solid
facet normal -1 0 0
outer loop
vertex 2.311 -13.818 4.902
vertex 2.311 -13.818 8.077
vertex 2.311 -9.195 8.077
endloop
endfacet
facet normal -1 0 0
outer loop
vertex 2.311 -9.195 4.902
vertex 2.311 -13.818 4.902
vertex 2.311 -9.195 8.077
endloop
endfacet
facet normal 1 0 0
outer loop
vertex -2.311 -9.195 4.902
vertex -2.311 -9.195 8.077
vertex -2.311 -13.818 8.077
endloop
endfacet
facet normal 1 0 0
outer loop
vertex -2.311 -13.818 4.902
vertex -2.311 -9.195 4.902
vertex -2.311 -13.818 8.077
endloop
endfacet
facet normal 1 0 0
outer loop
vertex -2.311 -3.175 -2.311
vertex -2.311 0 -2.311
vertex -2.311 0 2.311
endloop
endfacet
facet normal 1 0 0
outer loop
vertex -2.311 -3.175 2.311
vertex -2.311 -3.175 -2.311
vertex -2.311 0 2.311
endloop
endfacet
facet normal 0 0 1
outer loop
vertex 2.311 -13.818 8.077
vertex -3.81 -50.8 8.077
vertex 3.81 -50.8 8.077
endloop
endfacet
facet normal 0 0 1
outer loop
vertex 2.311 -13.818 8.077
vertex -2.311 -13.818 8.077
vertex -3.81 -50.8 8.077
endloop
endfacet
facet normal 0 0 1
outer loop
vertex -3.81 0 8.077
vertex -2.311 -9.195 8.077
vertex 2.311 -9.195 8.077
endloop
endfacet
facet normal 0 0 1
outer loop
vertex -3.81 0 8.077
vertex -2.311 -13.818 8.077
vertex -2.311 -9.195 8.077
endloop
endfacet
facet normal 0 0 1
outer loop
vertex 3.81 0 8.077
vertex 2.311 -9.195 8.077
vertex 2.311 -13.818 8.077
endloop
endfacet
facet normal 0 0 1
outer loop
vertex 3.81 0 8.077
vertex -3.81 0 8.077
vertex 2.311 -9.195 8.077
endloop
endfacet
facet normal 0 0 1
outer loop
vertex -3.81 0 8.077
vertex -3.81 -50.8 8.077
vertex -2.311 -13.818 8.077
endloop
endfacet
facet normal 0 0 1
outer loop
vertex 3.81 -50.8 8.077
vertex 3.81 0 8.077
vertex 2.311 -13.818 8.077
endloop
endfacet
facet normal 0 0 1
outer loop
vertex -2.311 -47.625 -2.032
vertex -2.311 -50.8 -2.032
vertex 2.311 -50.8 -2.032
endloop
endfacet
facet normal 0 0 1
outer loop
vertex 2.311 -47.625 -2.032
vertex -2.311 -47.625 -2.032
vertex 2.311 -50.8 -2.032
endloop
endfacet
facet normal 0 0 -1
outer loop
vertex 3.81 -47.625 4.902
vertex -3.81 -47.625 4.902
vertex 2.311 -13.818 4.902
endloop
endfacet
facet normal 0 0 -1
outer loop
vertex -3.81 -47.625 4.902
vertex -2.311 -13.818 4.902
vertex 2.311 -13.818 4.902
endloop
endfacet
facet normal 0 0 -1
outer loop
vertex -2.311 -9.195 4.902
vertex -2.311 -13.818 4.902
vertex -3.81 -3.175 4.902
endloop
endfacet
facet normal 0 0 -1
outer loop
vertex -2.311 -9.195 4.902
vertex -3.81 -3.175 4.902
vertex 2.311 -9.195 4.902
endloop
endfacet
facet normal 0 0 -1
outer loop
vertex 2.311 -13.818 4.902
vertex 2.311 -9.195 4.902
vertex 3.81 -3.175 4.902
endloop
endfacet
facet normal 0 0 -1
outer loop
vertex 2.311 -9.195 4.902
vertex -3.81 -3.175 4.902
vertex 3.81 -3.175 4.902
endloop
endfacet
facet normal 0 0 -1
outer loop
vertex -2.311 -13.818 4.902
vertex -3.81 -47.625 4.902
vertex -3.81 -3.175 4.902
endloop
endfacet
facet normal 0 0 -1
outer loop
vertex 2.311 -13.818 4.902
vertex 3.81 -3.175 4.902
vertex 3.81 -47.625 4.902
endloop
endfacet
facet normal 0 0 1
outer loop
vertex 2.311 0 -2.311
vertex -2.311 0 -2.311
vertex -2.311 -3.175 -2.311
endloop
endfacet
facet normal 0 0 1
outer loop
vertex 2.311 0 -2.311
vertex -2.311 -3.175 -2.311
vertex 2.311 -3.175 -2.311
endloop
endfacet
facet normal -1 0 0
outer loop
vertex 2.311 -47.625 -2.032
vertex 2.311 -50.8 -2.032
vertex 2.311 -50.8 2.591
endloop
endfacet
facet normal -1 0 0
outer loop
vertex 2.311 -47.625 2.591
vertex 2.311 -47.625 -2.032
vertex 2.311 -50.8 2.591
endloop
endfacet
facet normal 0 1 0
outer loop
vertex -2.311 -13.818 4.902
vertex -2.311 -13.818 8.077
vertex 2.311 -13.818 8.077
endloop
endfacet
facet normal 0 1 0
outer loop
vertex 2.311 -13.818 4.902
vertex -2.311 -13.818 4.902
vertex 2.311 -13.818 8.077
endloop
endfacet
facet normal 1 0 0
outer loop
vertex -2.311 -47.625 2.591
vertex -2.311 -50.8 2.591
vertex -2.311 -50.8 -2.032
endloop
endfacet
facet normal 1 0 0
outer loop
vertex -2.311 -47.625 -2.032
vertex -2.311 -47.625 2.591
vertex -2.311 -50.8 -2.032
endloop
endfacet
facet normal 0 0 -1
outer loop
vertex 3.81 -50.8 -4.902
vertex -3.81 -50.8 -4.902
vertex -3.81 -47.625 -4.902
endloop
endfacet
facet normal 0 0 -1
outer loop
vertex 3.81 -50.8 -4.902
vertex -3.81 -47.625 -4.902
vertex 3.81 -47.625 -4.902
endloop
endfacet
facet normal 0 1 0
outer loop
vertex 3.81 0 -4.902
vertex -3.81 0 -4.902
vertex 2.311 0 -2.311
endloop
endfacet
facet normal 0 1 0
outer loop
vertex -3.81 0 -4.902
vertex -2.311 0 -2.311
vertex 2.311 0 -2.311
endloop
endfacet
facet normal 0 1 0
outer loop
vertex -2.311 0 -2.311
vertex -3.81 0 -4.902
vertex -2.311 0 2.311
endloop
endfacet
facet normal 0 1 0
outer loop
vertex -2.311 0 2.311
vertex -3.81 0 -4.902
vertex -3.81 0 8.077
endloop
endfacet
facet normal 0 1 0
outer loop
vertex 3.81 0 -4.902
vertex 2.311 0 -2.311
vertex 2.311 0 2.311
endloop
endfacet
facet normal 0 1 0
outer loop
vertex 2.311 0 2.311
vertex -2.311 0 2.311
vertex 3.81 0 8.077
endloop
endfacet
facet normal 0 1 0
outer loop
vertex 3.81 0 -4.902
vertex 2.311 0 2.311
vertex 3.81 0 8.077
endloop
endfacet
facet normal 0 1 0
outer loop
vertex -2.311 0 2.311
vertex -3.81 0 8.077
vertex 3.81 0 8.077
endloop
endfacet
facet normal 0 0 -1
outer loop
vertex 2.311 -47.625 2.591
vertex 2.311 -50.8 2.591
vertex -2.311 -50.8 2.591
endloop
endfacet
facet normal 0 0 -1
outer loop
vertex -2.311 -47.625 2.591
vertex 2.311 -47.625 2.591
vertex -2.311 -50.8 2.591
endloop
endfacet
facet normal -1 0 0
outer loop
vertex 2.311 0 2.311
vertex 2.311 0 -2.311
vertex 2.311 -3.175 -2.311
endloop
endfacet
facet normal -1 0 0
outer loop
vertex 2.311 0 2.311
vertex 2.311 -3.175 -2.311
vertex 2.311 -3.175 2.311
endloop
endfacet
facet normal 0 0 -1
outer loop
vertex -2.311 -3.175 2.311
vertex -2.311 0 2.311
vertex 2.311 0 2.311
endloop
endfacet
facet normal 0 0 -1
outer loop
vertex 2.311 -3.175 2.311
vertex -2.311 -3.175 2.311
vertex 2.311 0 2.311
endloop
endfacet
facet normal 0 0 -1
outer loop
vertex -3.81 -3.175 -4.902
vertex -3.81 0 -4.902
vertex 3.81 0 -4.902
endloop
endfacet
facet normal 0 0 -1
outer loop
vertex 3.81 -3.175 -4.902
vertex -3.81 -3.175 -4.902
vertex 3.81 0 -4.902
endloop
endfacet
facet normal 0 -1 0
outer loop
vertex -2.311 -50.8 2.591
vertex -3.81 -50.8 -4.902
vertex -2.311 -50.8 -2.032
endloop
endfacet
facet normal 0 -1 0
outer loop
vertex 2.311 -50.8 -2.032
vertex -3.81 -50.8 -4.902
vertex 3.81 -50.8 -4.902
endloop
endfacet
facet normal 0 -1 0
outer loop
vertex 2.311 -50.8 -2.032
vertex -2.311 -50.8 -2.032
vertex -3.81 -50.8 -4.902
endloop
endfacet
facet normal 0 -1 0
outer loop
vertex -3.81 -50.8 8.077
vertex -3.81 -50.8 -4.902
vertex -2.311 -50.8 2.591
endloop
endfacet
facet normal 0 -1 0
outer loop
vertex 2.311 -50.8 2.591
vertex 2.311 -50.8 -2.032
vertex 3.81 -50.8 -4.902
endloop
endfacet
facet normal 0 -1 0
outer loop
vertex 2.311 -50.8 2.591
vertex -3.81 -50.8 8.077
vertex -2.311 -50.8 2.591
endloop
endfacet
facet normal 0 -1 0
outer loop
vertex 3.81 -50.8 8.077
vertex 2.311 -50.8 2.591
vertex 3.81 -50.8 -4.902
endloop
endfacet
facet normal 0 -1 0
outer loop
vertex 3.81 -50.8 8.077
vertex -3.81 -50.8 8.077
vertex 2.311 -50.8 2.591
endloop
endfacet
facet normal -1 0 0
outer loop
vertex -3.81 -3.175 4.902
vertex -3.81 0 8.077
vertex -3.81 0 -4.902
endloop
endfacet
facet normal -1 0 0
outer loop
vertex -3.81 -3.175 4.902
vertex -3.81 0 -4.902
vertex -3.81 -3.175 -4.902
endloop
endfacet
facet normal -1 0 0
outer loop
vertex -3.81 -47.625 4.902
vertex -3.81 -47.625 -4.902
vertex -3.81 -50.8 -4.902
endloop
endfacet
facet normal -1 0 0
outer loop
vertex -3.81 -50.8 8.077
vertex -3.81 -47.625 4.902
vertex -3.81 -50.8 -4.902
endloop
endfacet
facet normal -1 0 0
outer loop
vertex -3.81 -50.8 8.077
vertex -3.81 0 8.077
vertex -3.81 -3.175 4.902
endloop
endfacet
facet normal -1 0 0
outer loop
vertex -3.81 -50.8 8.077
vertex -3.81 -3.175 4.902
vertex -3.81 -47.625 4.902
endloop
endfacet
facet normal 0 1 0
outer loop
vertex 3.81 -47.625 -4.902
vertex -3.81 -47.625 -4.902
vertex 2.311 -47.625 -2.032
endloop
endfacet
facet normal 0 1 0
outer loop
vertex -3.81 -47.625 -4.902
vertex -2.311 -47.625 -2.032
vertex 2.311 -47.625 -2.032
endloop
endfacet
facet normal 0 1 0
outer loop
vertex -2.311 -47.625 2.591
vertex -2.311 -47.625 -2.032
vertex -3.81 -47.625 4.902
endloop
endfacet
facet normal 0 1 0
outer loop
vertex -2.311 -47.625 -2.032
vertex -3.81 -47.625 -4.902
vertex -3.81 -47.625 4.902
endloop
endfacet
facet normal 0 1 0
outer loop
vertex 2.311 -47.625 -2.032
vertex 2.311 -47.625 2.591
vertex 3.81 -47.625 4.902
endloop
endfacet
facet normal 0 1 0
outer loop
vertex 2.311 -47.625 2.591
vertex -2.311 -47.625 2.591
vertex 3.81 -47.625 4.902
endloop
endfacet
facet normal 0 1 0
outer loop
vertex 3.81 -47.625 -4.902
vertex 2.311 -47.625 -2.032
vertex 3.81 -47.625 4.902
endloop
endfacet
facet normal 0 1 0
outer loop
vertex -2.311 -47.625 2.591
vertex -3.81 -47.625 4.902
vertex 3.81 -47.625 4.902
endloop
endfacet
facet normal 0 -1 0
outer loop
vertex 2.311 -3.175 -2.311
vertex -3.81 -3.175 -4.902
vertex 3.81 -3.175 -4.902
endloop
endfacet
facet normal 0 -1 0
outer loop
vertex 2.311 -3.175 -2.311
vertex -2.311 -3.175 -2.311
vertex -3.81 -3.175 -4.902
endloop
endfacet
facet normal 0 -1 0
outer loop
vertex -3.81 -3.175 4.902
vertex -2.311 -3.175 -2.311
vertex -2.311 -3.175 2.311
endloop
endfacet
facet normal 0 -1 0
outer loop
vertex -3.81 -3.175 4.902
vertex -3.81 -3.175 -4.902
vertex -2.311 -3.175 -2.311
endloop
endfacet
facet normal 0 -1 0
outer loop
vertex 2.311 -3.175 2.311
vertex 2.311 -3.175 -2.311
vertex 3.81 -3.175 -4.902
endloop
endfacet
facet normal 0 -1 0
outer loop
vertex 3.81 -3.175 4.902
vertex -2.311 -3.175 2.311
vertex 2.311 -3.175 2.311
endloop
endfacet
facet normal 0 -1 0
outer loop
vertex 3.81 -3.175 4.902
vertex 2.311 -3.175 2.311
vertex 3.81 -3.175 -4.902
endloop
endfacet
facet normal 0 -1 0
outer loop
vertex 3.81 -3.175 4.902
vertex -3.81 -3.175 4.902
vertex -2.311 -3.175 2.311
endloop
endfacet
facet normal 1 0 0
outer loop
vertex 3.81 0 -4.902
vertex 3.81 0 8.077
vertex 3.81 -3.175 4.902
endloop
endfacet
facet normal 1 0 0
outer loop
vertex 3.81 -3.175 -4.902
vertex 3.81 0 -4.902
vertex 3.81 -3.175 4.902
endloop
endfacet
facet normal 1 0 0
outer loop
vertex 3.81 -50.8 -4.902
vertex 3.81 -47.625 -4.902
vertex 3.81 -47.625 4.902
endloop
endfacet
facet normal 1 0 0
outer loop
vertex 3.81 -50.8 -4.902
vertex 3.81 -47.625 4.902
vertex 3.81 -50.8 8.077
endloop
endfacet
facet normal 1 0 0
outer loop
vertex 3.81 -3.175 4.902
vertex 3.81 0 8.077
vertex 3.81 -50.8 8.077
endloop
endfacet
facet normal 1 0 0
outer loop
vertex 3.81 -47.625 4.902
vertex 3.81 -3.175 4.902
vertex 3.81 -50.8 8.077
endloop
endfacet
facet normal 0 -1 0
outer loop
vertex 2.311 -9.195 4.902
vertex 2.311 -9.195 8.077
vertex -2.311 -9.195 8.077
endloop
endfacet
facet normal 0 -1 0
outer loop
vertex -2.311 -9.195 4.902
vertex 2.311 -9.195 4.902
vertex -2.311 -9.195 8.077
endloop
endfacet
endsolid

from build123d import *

# Parameters (mm, degrees)
F0_W     = 7.62
F0_H     = 3.175
F1_DEPTH = 50.8
F0_H_2   = 9.8044
F0_W_2   = 4.6228
F0_H_3   = 4.6228
F2_DEPTH = 3.175
F3_W     = 7.62
F3_H     = 3.175
F4_DEPTH = 9.8044
F6_DEPTH = 25.4
F8_DEPTH = 25.4


with BuildPart() as f1:
    # F0 (on Front) → F1 (new body)
    with BuildSketch(Plane.XZ):
        with Locations((0, 6.4897)):
            Rectangle(F0_W, F0_H)
    extrude(amount=F1_DEPTH)

    # F0 (on Front) → F2 (join)
    with BuildSketch(Plane.XZ):
        Rectangle(F0_W, F0_H_2)
        Rectangle(F0_W_2, F0_H_3, mode=Mode.SUBTRACT)
    extrude(amount=F2_DEPTH)

    # F3 (on face) → F4 (join)
    with BuildSketch(Plane(origin=(0, 0, 4.9022), x_dir=(1, 0, 0), z_dir=(0, 0, -1))):
        with Locations((0, 49.2125)):
            Rectangle(F3_W, F3_H)
    extrude(amount=F4_DEPTH)

    # F5 (on face) → F6 (cut)
    with BuildSketch(Plane.XZ.offset(50.8)):
        Polygon((2.3114, -2.032073), (2.3114, 1.5875), (2.3114, 2.590727), (-2.3114, 2.590727), (-2.3114, -2.032073), align=None)
    extrude(amount=-F6_DEPTH, mode=Mode.SUBTRACT)

    # F7 (on face) → F8 (cut)
    with BuildSketch(Plane.XY.offset(8.0772)):
        Polygon((2.3114, -9.1948), (0, -9.1948), (-2.3114, -9.1948), (-2.3114, -13.8176), (2.3114, -13.8176), align=None)
    extrude(amount=-F8_DEPTH, mode=Mode.SUBTRACT)


solid = f1.part
